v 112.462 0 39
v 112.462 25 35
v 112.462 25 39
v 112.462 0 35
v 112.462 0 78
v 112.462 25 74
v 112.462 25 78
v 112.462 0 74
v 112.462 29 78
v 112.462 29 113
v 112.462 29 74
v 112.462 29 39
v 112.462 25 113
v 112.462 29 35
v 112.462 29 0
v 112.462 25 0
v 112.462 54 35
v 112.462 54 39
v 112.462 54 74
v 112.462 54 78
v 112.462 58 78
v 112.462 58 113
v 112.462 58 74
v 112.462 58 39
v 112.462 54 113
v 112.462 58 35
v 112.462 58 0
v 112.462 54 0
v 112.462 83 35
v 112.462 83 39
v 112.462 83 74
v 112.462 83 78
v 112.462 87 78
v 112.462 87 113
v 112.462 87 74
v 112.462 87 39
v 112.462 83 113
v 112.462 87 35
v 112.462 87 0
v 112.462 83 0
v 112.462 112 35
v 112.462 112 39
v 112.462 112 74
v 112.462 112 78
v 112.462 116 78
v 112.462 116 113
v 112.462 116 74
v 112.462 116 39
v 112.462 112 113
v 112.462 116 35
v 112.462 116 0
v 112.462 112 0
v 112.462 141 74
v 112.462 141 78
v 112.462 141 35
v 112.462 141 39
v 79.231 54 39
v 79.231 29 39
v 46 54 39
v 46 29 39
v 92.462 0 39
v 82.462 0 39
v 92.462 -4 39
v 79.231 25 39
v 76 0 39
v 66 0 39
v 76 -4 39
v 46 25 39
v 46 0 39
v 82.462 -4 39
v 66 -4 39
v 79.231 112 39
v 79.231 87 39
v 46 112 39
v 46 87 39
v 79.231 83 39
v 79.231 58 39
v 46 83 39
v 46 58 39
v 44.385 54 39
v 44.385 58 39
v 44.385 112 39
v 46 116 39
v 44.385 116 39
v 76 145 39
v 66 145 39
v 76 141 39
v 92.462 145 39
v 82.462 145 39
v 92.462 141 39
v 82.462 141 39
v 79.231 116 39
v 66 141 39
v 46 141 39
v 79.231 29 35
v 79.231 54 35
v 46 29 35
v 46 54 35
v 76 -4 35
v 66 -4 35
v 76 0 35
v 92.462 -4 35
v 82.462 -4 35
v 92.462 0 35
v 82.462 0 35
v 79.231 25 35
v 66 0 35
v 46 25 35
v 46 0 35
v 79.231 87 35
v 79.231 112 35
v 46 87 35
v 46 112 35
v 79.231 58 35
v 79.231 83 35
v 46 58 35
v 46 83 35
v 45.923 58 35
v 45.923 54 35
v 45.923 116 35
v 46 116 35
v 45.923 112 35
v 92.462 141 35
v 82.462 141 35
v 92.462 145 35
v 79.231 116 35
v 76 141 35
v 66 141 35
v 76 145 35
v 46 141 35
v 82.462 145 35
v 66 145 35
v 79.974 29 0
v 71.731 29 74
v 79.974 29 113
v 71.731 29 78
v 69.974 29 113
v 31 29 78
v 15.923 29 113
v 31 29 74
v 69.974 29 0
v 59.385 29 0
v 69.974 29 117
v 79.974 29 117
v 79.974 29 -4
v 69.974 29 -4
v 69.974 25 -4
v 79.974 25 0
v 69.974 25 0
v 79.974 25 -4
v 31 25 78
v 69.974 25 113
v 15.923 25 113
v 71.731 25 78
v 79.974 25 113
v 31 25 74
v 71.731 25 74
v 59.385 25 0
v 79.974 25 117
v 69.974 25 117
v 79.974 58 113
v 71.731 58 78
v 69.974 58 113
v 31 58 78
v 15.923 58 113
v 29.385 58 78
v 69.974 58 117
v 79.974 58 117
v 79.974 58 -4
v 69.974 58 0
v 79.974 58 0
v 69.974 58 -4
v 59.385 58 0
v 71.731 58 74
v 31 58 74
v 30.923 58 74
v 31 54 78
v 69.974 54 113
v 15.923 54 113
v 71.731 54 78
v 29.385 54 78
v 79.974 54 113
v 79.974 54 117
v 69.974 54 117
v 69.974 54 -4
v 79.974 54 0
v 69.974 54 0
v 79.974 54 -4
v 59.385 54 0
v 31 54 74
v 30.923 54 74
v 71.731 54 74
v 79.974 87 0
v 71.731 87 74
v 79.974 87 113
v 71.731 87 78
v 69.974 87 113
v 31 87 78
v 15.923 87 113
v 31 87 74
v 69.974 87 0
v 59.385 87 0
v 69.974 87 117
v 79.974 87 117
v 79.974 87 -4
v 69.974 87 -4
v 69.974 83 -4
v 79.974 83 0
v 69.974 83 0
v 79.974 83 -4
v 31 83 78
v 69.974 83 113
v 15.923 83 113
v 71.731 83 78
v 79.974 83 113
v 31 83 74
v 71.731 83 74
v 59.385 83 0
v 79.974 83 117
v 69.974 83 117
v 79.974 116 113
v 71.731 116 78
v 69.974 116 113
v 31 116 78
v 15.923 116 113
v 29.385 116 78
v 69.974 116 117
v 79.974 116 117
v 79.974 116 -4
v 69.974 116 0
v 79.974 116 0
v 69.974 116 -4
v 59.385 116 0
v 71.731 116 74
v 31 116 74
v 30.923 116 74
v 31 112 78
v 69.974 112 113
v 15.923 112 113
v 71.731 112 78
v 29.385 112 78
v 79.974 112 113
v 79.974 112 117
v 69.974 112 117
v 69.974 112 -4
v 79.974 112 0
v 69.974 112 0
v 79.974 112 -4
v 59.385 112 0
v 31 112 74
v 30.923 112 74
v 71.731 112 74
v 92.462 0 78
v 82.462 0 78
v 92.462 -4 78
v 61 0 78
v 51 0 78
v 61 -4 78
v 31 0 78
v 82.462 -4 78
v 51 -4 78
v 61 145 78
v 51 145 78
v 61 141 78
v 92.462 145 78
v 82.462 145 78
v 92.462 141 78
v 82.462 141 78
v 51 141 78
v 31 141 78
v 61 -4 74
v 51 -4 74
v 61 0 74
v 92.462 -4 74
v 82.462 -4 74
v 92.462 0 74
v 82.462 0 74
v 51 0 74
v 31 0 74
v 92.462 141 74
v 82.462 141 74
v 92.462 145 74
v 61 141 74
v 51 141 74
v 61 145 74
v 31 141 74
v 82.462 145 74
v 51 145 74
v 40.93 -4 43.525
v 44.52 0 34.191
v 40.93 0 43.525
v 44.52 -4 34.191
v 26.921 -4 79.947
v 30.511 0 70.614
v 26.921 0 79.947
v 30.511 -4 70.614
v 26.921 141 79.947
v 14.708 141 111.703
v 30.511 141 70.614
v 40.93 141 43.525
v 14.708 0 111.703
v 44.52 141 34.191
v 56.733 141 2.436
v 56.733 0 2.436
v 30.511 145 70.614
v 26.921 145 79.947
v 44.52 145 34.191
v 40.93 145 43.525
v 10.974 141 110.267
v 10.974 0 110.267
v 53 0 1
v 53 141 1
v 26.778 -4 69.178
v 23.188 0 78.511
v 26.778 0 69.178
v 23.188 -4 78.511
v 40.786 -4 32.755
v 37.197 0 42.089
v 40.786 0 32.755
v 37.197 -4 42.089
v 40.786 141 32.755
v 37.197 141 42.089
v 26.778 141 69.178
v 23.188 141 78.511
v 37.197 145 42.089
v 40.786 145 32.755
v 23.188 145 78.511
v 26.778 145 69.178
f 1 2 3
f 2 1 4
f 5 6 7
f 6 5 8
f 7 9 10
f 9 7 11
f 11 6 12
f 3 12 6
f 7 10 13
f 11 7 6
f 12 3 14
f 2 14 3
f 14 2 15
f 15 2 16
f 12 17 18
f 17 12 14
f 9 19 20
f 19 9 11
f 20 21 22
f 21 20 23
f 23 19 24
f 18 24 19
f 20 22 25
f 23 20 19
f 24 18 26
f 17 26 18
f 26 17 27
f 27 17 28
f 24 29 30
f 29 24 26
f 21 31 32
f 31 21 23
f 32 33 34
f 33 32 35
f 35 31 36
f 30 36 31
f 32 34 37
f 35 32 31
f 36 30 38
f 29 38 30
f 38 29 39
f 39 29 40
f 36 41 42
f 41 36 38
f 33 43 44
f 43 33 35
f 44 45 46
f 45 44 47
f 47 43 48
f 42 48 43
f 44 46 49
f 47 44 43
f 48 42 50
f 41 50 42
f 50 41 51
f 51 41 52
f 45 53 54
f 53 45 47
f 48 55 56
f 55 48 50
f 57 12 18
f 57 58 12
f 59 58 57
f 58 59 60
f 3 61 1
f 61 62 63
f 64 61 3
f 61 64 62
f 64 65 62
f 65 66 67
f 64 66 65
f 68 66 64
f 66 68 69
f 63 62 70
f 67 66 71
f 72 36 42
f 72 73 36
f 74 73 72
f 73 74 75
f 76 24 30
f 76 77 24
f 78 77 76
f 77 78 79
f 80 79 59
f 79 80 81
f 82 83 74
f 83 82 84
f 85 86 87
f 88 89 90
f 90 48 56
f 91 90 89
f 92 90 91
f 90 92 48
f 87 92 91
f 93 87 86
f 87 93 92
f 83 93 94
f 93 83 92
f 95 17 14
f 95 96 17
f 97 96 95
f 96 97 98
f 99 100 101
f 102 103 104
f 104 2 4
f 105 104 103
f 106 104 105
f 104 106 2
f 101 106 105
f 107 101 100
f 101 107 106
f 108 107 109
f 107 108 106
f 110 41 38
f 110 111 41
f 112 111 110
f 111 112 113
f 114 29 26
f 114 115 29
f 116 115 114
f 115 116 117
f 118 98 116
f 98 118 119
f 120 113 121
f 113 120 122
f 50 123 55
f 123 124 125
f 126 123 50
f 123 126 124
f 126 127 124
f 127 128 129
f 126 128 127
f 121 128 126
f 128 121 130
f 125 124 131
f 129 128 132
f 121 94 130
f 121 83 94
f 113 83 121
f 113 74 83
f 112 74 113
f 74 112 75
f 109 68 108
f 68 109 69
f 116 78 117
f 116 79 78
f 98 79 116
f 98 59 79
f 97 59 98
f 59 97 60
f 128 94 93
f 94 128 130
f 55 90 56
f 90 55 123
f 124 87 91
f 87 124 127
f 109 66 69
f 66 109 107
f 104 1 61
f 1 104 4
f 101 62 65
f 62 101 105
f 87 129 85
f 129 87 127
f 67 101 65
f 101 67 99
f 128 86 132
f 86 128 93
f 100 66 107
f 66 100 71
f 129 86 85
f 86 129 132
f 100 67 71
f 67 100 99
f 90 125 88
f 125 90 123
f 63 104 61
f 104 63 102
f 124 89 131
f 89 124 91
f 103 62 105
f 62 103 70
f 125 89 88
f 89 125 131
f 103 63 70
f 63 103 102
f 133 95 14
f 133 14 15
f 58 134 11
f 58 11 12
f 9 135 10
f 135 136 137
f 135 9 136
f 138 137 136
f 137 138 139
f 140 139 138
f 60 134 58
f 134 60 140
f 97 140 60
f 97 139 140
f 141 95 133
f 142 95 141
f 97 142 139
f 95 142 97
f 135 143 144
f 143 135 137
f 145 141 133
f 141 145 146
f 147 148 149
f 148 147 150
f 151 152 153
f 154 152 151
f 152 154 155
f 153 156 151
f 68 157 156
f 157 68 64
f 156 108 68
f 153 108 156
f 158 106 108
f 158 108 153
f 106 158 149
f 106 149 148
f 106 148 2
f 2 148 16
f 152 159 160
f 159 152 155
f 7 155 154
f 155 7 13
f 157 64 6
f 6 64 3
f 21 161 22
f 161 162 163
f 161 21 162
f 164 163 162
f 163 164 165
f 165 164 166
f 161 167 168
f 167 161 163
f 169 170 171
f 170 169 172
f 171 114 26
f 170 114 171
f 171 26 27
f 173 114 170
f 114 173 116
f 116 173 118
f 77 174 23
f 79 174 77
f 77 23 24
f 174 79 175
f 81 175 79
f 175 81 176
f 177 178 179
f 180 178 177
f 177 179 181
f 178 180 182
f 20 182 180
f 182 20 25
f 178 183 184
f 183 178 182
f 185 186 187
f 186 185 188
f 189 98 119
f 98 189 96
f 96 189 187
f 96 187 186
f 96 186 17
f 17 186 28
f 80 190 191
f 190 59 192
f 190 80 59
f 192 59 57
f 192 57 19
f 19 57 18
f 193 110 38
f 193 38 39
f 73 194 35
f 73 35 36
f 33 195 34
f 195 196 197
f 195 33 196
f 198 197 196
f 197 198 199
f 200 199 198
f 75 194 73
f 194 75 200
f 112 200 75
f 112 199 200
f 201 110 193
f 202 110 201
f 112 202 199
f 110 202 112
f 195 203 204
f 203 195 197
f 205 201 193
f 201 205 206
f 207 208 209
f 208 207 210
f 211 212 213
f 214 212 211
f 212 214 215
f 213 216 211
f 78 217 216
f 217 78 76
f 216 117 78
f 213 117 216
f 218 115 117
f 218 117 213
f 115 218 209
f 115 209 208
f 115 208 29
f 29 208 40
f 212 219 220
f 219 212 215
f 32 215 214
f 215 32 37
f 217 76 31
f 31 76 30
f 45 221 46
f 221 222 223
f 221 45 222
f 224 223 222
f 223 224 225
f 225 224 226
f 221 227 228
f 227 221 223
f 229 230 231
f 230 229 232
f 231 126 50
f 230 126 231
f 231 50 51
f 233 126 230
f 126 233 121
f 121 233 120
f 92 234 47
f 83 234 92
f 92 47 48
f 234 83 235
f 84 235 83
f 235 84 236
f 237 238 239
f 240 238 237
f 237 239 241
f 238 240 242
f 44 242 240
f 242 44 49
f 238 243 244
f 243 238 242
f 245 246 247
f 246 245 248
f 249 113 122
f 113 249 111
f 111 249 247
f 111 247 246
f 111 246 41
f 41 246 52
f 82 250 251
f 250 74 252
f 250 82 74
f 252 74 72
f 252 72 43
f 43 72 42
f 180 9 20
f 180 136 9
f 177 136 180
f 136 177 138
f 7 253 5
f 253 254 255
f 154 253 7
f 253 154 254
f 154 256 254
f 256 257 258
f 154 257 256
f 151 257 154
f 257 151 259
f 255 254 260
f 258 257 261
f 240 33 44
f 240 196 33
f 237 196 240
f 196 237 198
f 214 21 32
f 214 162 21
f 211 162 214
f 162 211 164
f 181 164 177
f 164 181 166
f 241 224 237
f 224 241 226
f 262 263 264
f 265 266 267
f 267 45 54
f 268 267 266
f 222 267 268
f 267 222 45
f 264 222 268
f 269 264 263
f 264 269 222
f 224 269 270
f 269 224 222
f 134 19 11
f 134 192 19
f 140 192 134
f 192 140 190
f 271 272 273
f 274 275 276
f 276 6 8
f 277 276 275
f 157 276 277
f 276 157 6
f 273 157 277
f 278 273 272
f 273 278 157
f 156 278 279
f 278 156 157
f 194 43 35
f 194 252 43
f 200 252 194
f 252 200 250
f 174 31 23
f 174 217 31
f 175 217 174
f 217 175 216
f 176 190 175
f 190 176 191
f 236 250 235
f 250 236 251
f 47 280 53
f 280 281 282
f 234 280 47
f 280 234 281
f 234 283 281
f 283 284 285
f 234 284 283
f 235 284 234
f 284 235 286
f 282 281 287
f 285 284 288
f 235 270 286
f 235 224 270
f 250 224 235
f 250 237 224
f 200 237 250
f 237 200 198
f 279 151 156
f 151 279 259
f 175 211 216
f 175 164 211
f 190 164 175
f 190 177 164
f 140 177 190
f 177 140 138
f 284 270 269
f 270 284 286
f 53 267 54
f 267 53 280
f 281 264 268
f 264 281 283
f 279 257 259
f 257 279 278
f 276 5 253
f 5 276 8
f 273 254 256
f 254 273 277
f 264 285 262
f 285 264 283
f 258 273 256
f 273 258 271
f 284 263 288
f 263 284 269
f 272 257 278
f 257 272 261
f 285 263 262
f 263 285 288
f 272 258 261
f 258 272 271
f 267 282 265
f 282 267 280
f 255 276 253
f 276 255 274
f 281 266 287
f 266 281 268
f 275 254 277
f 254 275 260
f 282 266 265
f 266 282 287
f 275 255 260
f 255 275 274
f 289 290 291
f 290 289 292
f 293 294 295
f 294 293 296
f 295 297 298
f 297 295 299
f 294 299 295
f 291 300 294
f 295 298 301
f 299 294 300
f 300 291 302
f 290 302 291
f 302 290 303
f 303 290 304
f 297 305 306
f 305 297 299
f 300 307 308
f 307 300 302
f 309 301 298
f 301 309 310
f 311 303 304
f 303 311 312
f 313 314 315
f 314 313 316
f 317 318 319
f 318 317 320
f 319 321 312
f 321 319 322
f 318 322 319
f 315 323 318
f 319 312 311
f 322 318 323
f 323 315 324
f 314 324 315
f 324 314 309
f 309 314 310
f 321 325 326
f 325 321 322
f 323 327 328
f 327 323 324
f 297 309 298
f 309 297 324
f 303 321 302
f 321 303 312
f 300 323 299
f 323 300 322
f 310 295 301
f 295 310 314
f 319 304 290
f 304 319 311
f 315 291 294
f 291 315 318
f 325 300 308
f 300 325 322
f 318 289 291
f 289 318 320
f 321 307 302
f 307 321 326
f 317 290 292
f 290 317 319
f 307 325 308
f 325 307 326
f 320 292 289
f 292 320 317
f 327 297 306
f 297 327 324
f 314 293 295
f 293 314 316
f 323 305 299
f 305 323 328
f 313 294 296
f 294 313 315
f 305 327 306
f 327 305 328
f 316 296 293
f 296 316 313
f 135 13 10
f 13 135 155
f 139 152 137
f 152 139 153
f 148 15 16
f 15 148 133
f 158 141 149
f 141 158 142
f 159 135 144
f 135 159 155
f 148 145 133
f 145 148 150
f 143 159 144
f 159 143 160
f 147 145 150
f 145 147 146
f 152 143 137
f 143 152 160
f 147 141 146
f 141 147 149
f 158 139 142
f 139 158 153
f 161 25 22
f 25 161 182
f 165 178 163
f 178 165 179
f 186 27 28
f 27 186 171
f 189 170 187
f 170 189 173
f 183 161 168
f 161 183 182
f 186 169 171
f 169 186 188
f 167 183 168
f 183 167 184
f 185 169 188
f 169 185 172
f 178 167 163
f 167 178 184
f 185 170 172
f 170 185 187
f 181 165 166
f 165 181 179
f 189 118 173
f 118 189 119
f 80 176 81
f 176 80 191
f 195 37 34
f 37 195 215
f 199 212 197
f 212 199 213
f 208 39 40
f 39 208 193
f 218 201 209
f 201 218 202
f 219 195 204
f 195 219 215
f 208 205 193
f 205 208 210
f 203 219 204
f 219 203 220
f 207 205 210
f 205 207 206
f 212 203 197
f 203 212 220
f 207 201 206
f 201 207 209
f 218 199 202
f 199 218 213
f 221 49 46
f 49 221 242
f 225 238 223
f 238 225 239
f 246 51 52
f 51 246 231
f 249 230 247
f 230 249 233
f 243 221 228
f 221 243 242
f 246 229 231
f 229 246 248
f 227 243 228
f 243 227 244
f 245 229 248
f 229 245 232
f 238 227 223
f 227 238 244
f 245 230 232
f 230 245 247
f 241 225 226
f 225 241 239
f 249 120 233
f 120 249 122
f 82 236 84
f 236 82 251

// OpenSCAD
// file: harmonica-body.scad
harmonicaHeight = 30;
harmonicaLength = 105;
harmonicaThickness = 20;

module harmonicaBody() {
    cube([harmonicaLength, harmonicaThickness, harmonicaHeight]);
}

rotate([0,90,0])
  translate([-harmonicaLength,0,0])
  harmonicaBody();
// file: dimensions.scad
/*
 * This file regroup all the common dimensions, angles, and repetitions
 */

// how many harmonica do you want to store on a given row?
$horizontalPlacements = 5;
$verticalPlacements = 3;

/* hole around the harmonica
 *    ______________
 *   /             /|
 *  /_____________/ | <- height_gap
 *  |             | |
 *  |             | /
 *  |_____________|/ <- thick_gap
 *       ^ length_gap
 */
$thickGap = 25;
//$height_gap = 30; <- this one was a bit tight for Seydels and too tight for the old golden melody
$heightGap = 35; // <- I'll increase that somewhat so I can also install some felt inside the box.
$lengthGap = 105;

// base material thickness, this represent the thickness of the most commonly used material.
$materialThickness = 4;

/* On different rows, harmonica will be seating more or less deelply inside (higher rows deepers than lower ones).
 * You'll probably want to tweak that a bit:
 * - make then seat far enough that the lid doesn't need to be too huge to cover them
 * - not too far so that they are easy to pick up
 * - have a good difference between the different rows so you can see them all nicely
*/
$minHarpSeating = 55;
$maxHarpSeating = 85;

// the difference between the harp seatings dictates how slanted should the inside slant be.
deltaSeating = $maxHarpSeating - $minHarpSeating;
deltaHeight = ($heightGap + $materialThickness) * ($verticalPlacements - 1);
$slantAngle = 90 - atan(deltaHeight / deltaSeating);
echo("slant angle -> ", $slantAngle);


/*
 * inset looks like: 
 *
 * =================================== <- outset border
 * |\
 * | \ <-     maxHarpSeating     ->
 * |  \----------------------------
 * |   \
 * |    \
 * |     \-------------------------      <- vertical separator
 * |      \
 * |       \
 * |        \----------------------
 * | slant ->\
 * |          \<- minHarpSeating ->
 * ===================================
 *                                 \_/ 
 *                                  ^outsetMargin
 *  \_________insetLength_________/
 */

// how far should the inset goes?
insetHeight = $heightGap + ($heightGap + $materialThickness) * ($verticalPlacements - 1);
slantDeltaLength = insetHeight * deltaSeating / deltaHeight;
$insetMargin = 10;
$insetLength = $minHarpSeating + slantDeltaLength + $materialThickness + $insetMargin;
echo("insetLength -> ", $insetLength);
// how much futher should the outset cover?
$outsetMargin = 5;

// Box dimensions: 
$boxWidth = $horizontalPlacements * ($thickGap + $materialThickness) + $materialThickness;
$boxHeight = $insetLength + $outsetMargin;
$boxDepth = $verticalPlacements * ($heightGap + $materialThickness) + $materialThickness;

// the angle at which the box should sit when the lid is opened
// !TODO adjust the angle if you want a flat part on the top of the standing lid
$boxTiltingAngle = 35;
// main file
include <./dimensions.scad>
use <./harmonica-body.scad>

margin = 5;

insideWidth = $boxWidth - 2* $materialThickness;


function offsetCalculator(level) = 
  $insetMargin + $materialThickness + ($verticalPlacements - level) *($heightGap + $materialThickness) / tan (90-$slantAngle) + 2;

echo("offset #1-> ", offsetCalculator(0));
echo("offset #2-> ", offsetCalculator(1));
echo("offset #3-> ", offsetCalculator(2));

module insideSlant() {
  // inside-slant offset ->
  slantHeight = ($heightGap + ( $heightGap + $materialThickness) * ($verticalPlacements -1)) / sin(90 - $slantAngle) - $materialThickness;
  union() {
    cube([$materialThickness, insideWidth, slantHeight]);
    translate([0, - $materialThickness, (slantHeight / 3) - 5])
    cube([$materialThickness, insideWidth + 2 * $materialThickness, 10]);
    translate([0, - $materialThickness, 2 * (slantHeight / 3) - 5])
    cube([$materialThickness, insideWidth + 2 * $materialThickness, 10]);
  }
}


module horizontalPlank(height, level = 1) {
  echo("horizontalPlank -> ", level);
  offset = offsetCalculator(level);
  offsetted_height = height - offset;
  translate([offset, 0, 0])
  difference () {
    union() {
      //base
      cube([offsetted_height, insideWidth, $materialThickness]);
      // first set of wings
      translate([20, - $materialThickness, 0])
        cube([10, insideWidth + 2 * $materialThickness, $materialThickness]);
      // second set of wings
      translate([offsetted_height - 30, - $materialThickness, 0])
        cube([10, insideWidth + 2 * $materialThickness, $materialThickness]);
    }
    // notches
    for(i=[0:($horizontalPlacements - 2)]) {
      horizontalShift = (i + 1) * $thickGap + (i *  $materialThickness);
      if (i % 2 != 0){
        translate([offsetted_height / 2, horizontalShift, - margin ])
        cube([offsetted_height / 2 + margin, $materialThickness, 2*margin +  $materialThickness]);
      } else {
        translate([- margin, horizontalShift, - margin])
        cube([offsetted_height / 2 + margin, $materialThickness, 2*margin + $materialThickness]);
      }
    }
  }
}

module verticalSeparator(height, is_even = true) {
  offset = offsetCalculator(1);
  offsetted_height = height - offset;
  separator_width = $heightGap + ($verticalPlacements - 1) * ($materialThickness + $heightGap);

  base = 4 + margin + $insetMargin;
  bottomOffset = base + (separator_width + 2 * margin) / tan(90-$slantAngle);

  // wedge cutout
  wedgePoints = [
    [0, 0, separator_width + 2 * margin], // 0
    [base, 0, separator_width + 2 * margin], // 1
    [bottomOffset, 0, 0], // 2
    [0, 0, 0], // 3
    [0, $materialThickness + 2 * margin, separator_width + 2 * margin], // 4
    [base, $materialThickness + 2 * margin, separator_width + 2 * margin], // 5
    [bottomOffset, $materialThickness + 2 * margin, 0], // 6
    [0, $materialThickness + 2 * margin, 0] // 7
  ];
  wedgeFaces = [
    [4, 5, 1, 0], // top
    [0, 1, 2, 3], // front
    [5, 6, 2, 1], // side
    [7, 6, 5, 4], // back
    [6, 7, 3, 2], // bottom
    [7, 4, 0, 3] // other side
  ];

  difference() {
    union() {
      cube([height, $materialThickness, separator_width]);
      translate([2 * height / 3 - 5, 0, - $materialThickness])
        cube([10, $materialThickness, separator_width + 2 * $materialThickness]);
    }
    translate([-margin, -margin, -margin])
      polyhedron(wedgePoints, wedgeFaces);

    for(i=[1:$verticalPlacements - 1]) {
      offset = offsetCalculator(i);
      offsetted_height = height - offset;
      if (is_even) {
        translate([offset + offsetted_height / 2, -margin, $heightGap + ($heightGap + $materialThickness) * (i-1)])
          cube([offsetted_height / 2 + margin, $materialThickness + 2 * margin, $materialThickness]);
      } else {
        translate([offset - margin, -margin, $heightGap + ($heightGap + $materialThickness) * (i-1)])
          cube([offsetted_height / 2 + margin, $materialThickness + 2 * margin, $materialThickness]);
      }
    }
  }
}

module boxInset(height = $insetLength, isSplit = false) {
  for(i=[1:($verticalPlacements - 1)]) {
    translate([0, 0, $heightGap + (i-1) * ($heightGap + $materialThickness)])
      horizontalPlank(height, i);
  }

  translate([(isSplit? -1.2*height : 0) + offsetCalculator(0) - $materialThickness * 2, 0, 0.25 * $materialThickness])
  rotate([0, -$slantAngle, 0])
    insideSlant();

  for(i=[0:($horizontalPlacements - 2)]) {
    x_offset = isSplit ? ((i % 2 == 0) ? -1.1*height : 1.1*height) : 0;
    horizontalShift = [x_offset, (i + 1) * $thickGap + i * $materialThickness, 0];
    if(i % 2 == 0) {
      color("blue")
      translate(horizontalShift)
      verticalSeparator(height, true);
    } else {
      color("green")
      translate(horizontalShift)
      verticalSeparator(height, false);
    }
  }
}

boxInset(isSplit = false);

if (false) {
  translate([offsetCalculator(0), 0, 0])
    union() {
      color("white")
      harmonicaBody();
      color("magenta")
      cube([$minHarpSeating, 20, 30]);
    }
  color("teal")
  translate([offsetCalculator(1), 0, $materialThickness + $heightGap])
    harmonicaBody();
  translate([offsetCalculator(2), 0, 2*$materialThickness + 2*$heightGap])
    union() {
      color("gray")
      harmonicaBody();
      color("blue")
      cube([$maxHarpSeating, 20, 30]);
    }
}
